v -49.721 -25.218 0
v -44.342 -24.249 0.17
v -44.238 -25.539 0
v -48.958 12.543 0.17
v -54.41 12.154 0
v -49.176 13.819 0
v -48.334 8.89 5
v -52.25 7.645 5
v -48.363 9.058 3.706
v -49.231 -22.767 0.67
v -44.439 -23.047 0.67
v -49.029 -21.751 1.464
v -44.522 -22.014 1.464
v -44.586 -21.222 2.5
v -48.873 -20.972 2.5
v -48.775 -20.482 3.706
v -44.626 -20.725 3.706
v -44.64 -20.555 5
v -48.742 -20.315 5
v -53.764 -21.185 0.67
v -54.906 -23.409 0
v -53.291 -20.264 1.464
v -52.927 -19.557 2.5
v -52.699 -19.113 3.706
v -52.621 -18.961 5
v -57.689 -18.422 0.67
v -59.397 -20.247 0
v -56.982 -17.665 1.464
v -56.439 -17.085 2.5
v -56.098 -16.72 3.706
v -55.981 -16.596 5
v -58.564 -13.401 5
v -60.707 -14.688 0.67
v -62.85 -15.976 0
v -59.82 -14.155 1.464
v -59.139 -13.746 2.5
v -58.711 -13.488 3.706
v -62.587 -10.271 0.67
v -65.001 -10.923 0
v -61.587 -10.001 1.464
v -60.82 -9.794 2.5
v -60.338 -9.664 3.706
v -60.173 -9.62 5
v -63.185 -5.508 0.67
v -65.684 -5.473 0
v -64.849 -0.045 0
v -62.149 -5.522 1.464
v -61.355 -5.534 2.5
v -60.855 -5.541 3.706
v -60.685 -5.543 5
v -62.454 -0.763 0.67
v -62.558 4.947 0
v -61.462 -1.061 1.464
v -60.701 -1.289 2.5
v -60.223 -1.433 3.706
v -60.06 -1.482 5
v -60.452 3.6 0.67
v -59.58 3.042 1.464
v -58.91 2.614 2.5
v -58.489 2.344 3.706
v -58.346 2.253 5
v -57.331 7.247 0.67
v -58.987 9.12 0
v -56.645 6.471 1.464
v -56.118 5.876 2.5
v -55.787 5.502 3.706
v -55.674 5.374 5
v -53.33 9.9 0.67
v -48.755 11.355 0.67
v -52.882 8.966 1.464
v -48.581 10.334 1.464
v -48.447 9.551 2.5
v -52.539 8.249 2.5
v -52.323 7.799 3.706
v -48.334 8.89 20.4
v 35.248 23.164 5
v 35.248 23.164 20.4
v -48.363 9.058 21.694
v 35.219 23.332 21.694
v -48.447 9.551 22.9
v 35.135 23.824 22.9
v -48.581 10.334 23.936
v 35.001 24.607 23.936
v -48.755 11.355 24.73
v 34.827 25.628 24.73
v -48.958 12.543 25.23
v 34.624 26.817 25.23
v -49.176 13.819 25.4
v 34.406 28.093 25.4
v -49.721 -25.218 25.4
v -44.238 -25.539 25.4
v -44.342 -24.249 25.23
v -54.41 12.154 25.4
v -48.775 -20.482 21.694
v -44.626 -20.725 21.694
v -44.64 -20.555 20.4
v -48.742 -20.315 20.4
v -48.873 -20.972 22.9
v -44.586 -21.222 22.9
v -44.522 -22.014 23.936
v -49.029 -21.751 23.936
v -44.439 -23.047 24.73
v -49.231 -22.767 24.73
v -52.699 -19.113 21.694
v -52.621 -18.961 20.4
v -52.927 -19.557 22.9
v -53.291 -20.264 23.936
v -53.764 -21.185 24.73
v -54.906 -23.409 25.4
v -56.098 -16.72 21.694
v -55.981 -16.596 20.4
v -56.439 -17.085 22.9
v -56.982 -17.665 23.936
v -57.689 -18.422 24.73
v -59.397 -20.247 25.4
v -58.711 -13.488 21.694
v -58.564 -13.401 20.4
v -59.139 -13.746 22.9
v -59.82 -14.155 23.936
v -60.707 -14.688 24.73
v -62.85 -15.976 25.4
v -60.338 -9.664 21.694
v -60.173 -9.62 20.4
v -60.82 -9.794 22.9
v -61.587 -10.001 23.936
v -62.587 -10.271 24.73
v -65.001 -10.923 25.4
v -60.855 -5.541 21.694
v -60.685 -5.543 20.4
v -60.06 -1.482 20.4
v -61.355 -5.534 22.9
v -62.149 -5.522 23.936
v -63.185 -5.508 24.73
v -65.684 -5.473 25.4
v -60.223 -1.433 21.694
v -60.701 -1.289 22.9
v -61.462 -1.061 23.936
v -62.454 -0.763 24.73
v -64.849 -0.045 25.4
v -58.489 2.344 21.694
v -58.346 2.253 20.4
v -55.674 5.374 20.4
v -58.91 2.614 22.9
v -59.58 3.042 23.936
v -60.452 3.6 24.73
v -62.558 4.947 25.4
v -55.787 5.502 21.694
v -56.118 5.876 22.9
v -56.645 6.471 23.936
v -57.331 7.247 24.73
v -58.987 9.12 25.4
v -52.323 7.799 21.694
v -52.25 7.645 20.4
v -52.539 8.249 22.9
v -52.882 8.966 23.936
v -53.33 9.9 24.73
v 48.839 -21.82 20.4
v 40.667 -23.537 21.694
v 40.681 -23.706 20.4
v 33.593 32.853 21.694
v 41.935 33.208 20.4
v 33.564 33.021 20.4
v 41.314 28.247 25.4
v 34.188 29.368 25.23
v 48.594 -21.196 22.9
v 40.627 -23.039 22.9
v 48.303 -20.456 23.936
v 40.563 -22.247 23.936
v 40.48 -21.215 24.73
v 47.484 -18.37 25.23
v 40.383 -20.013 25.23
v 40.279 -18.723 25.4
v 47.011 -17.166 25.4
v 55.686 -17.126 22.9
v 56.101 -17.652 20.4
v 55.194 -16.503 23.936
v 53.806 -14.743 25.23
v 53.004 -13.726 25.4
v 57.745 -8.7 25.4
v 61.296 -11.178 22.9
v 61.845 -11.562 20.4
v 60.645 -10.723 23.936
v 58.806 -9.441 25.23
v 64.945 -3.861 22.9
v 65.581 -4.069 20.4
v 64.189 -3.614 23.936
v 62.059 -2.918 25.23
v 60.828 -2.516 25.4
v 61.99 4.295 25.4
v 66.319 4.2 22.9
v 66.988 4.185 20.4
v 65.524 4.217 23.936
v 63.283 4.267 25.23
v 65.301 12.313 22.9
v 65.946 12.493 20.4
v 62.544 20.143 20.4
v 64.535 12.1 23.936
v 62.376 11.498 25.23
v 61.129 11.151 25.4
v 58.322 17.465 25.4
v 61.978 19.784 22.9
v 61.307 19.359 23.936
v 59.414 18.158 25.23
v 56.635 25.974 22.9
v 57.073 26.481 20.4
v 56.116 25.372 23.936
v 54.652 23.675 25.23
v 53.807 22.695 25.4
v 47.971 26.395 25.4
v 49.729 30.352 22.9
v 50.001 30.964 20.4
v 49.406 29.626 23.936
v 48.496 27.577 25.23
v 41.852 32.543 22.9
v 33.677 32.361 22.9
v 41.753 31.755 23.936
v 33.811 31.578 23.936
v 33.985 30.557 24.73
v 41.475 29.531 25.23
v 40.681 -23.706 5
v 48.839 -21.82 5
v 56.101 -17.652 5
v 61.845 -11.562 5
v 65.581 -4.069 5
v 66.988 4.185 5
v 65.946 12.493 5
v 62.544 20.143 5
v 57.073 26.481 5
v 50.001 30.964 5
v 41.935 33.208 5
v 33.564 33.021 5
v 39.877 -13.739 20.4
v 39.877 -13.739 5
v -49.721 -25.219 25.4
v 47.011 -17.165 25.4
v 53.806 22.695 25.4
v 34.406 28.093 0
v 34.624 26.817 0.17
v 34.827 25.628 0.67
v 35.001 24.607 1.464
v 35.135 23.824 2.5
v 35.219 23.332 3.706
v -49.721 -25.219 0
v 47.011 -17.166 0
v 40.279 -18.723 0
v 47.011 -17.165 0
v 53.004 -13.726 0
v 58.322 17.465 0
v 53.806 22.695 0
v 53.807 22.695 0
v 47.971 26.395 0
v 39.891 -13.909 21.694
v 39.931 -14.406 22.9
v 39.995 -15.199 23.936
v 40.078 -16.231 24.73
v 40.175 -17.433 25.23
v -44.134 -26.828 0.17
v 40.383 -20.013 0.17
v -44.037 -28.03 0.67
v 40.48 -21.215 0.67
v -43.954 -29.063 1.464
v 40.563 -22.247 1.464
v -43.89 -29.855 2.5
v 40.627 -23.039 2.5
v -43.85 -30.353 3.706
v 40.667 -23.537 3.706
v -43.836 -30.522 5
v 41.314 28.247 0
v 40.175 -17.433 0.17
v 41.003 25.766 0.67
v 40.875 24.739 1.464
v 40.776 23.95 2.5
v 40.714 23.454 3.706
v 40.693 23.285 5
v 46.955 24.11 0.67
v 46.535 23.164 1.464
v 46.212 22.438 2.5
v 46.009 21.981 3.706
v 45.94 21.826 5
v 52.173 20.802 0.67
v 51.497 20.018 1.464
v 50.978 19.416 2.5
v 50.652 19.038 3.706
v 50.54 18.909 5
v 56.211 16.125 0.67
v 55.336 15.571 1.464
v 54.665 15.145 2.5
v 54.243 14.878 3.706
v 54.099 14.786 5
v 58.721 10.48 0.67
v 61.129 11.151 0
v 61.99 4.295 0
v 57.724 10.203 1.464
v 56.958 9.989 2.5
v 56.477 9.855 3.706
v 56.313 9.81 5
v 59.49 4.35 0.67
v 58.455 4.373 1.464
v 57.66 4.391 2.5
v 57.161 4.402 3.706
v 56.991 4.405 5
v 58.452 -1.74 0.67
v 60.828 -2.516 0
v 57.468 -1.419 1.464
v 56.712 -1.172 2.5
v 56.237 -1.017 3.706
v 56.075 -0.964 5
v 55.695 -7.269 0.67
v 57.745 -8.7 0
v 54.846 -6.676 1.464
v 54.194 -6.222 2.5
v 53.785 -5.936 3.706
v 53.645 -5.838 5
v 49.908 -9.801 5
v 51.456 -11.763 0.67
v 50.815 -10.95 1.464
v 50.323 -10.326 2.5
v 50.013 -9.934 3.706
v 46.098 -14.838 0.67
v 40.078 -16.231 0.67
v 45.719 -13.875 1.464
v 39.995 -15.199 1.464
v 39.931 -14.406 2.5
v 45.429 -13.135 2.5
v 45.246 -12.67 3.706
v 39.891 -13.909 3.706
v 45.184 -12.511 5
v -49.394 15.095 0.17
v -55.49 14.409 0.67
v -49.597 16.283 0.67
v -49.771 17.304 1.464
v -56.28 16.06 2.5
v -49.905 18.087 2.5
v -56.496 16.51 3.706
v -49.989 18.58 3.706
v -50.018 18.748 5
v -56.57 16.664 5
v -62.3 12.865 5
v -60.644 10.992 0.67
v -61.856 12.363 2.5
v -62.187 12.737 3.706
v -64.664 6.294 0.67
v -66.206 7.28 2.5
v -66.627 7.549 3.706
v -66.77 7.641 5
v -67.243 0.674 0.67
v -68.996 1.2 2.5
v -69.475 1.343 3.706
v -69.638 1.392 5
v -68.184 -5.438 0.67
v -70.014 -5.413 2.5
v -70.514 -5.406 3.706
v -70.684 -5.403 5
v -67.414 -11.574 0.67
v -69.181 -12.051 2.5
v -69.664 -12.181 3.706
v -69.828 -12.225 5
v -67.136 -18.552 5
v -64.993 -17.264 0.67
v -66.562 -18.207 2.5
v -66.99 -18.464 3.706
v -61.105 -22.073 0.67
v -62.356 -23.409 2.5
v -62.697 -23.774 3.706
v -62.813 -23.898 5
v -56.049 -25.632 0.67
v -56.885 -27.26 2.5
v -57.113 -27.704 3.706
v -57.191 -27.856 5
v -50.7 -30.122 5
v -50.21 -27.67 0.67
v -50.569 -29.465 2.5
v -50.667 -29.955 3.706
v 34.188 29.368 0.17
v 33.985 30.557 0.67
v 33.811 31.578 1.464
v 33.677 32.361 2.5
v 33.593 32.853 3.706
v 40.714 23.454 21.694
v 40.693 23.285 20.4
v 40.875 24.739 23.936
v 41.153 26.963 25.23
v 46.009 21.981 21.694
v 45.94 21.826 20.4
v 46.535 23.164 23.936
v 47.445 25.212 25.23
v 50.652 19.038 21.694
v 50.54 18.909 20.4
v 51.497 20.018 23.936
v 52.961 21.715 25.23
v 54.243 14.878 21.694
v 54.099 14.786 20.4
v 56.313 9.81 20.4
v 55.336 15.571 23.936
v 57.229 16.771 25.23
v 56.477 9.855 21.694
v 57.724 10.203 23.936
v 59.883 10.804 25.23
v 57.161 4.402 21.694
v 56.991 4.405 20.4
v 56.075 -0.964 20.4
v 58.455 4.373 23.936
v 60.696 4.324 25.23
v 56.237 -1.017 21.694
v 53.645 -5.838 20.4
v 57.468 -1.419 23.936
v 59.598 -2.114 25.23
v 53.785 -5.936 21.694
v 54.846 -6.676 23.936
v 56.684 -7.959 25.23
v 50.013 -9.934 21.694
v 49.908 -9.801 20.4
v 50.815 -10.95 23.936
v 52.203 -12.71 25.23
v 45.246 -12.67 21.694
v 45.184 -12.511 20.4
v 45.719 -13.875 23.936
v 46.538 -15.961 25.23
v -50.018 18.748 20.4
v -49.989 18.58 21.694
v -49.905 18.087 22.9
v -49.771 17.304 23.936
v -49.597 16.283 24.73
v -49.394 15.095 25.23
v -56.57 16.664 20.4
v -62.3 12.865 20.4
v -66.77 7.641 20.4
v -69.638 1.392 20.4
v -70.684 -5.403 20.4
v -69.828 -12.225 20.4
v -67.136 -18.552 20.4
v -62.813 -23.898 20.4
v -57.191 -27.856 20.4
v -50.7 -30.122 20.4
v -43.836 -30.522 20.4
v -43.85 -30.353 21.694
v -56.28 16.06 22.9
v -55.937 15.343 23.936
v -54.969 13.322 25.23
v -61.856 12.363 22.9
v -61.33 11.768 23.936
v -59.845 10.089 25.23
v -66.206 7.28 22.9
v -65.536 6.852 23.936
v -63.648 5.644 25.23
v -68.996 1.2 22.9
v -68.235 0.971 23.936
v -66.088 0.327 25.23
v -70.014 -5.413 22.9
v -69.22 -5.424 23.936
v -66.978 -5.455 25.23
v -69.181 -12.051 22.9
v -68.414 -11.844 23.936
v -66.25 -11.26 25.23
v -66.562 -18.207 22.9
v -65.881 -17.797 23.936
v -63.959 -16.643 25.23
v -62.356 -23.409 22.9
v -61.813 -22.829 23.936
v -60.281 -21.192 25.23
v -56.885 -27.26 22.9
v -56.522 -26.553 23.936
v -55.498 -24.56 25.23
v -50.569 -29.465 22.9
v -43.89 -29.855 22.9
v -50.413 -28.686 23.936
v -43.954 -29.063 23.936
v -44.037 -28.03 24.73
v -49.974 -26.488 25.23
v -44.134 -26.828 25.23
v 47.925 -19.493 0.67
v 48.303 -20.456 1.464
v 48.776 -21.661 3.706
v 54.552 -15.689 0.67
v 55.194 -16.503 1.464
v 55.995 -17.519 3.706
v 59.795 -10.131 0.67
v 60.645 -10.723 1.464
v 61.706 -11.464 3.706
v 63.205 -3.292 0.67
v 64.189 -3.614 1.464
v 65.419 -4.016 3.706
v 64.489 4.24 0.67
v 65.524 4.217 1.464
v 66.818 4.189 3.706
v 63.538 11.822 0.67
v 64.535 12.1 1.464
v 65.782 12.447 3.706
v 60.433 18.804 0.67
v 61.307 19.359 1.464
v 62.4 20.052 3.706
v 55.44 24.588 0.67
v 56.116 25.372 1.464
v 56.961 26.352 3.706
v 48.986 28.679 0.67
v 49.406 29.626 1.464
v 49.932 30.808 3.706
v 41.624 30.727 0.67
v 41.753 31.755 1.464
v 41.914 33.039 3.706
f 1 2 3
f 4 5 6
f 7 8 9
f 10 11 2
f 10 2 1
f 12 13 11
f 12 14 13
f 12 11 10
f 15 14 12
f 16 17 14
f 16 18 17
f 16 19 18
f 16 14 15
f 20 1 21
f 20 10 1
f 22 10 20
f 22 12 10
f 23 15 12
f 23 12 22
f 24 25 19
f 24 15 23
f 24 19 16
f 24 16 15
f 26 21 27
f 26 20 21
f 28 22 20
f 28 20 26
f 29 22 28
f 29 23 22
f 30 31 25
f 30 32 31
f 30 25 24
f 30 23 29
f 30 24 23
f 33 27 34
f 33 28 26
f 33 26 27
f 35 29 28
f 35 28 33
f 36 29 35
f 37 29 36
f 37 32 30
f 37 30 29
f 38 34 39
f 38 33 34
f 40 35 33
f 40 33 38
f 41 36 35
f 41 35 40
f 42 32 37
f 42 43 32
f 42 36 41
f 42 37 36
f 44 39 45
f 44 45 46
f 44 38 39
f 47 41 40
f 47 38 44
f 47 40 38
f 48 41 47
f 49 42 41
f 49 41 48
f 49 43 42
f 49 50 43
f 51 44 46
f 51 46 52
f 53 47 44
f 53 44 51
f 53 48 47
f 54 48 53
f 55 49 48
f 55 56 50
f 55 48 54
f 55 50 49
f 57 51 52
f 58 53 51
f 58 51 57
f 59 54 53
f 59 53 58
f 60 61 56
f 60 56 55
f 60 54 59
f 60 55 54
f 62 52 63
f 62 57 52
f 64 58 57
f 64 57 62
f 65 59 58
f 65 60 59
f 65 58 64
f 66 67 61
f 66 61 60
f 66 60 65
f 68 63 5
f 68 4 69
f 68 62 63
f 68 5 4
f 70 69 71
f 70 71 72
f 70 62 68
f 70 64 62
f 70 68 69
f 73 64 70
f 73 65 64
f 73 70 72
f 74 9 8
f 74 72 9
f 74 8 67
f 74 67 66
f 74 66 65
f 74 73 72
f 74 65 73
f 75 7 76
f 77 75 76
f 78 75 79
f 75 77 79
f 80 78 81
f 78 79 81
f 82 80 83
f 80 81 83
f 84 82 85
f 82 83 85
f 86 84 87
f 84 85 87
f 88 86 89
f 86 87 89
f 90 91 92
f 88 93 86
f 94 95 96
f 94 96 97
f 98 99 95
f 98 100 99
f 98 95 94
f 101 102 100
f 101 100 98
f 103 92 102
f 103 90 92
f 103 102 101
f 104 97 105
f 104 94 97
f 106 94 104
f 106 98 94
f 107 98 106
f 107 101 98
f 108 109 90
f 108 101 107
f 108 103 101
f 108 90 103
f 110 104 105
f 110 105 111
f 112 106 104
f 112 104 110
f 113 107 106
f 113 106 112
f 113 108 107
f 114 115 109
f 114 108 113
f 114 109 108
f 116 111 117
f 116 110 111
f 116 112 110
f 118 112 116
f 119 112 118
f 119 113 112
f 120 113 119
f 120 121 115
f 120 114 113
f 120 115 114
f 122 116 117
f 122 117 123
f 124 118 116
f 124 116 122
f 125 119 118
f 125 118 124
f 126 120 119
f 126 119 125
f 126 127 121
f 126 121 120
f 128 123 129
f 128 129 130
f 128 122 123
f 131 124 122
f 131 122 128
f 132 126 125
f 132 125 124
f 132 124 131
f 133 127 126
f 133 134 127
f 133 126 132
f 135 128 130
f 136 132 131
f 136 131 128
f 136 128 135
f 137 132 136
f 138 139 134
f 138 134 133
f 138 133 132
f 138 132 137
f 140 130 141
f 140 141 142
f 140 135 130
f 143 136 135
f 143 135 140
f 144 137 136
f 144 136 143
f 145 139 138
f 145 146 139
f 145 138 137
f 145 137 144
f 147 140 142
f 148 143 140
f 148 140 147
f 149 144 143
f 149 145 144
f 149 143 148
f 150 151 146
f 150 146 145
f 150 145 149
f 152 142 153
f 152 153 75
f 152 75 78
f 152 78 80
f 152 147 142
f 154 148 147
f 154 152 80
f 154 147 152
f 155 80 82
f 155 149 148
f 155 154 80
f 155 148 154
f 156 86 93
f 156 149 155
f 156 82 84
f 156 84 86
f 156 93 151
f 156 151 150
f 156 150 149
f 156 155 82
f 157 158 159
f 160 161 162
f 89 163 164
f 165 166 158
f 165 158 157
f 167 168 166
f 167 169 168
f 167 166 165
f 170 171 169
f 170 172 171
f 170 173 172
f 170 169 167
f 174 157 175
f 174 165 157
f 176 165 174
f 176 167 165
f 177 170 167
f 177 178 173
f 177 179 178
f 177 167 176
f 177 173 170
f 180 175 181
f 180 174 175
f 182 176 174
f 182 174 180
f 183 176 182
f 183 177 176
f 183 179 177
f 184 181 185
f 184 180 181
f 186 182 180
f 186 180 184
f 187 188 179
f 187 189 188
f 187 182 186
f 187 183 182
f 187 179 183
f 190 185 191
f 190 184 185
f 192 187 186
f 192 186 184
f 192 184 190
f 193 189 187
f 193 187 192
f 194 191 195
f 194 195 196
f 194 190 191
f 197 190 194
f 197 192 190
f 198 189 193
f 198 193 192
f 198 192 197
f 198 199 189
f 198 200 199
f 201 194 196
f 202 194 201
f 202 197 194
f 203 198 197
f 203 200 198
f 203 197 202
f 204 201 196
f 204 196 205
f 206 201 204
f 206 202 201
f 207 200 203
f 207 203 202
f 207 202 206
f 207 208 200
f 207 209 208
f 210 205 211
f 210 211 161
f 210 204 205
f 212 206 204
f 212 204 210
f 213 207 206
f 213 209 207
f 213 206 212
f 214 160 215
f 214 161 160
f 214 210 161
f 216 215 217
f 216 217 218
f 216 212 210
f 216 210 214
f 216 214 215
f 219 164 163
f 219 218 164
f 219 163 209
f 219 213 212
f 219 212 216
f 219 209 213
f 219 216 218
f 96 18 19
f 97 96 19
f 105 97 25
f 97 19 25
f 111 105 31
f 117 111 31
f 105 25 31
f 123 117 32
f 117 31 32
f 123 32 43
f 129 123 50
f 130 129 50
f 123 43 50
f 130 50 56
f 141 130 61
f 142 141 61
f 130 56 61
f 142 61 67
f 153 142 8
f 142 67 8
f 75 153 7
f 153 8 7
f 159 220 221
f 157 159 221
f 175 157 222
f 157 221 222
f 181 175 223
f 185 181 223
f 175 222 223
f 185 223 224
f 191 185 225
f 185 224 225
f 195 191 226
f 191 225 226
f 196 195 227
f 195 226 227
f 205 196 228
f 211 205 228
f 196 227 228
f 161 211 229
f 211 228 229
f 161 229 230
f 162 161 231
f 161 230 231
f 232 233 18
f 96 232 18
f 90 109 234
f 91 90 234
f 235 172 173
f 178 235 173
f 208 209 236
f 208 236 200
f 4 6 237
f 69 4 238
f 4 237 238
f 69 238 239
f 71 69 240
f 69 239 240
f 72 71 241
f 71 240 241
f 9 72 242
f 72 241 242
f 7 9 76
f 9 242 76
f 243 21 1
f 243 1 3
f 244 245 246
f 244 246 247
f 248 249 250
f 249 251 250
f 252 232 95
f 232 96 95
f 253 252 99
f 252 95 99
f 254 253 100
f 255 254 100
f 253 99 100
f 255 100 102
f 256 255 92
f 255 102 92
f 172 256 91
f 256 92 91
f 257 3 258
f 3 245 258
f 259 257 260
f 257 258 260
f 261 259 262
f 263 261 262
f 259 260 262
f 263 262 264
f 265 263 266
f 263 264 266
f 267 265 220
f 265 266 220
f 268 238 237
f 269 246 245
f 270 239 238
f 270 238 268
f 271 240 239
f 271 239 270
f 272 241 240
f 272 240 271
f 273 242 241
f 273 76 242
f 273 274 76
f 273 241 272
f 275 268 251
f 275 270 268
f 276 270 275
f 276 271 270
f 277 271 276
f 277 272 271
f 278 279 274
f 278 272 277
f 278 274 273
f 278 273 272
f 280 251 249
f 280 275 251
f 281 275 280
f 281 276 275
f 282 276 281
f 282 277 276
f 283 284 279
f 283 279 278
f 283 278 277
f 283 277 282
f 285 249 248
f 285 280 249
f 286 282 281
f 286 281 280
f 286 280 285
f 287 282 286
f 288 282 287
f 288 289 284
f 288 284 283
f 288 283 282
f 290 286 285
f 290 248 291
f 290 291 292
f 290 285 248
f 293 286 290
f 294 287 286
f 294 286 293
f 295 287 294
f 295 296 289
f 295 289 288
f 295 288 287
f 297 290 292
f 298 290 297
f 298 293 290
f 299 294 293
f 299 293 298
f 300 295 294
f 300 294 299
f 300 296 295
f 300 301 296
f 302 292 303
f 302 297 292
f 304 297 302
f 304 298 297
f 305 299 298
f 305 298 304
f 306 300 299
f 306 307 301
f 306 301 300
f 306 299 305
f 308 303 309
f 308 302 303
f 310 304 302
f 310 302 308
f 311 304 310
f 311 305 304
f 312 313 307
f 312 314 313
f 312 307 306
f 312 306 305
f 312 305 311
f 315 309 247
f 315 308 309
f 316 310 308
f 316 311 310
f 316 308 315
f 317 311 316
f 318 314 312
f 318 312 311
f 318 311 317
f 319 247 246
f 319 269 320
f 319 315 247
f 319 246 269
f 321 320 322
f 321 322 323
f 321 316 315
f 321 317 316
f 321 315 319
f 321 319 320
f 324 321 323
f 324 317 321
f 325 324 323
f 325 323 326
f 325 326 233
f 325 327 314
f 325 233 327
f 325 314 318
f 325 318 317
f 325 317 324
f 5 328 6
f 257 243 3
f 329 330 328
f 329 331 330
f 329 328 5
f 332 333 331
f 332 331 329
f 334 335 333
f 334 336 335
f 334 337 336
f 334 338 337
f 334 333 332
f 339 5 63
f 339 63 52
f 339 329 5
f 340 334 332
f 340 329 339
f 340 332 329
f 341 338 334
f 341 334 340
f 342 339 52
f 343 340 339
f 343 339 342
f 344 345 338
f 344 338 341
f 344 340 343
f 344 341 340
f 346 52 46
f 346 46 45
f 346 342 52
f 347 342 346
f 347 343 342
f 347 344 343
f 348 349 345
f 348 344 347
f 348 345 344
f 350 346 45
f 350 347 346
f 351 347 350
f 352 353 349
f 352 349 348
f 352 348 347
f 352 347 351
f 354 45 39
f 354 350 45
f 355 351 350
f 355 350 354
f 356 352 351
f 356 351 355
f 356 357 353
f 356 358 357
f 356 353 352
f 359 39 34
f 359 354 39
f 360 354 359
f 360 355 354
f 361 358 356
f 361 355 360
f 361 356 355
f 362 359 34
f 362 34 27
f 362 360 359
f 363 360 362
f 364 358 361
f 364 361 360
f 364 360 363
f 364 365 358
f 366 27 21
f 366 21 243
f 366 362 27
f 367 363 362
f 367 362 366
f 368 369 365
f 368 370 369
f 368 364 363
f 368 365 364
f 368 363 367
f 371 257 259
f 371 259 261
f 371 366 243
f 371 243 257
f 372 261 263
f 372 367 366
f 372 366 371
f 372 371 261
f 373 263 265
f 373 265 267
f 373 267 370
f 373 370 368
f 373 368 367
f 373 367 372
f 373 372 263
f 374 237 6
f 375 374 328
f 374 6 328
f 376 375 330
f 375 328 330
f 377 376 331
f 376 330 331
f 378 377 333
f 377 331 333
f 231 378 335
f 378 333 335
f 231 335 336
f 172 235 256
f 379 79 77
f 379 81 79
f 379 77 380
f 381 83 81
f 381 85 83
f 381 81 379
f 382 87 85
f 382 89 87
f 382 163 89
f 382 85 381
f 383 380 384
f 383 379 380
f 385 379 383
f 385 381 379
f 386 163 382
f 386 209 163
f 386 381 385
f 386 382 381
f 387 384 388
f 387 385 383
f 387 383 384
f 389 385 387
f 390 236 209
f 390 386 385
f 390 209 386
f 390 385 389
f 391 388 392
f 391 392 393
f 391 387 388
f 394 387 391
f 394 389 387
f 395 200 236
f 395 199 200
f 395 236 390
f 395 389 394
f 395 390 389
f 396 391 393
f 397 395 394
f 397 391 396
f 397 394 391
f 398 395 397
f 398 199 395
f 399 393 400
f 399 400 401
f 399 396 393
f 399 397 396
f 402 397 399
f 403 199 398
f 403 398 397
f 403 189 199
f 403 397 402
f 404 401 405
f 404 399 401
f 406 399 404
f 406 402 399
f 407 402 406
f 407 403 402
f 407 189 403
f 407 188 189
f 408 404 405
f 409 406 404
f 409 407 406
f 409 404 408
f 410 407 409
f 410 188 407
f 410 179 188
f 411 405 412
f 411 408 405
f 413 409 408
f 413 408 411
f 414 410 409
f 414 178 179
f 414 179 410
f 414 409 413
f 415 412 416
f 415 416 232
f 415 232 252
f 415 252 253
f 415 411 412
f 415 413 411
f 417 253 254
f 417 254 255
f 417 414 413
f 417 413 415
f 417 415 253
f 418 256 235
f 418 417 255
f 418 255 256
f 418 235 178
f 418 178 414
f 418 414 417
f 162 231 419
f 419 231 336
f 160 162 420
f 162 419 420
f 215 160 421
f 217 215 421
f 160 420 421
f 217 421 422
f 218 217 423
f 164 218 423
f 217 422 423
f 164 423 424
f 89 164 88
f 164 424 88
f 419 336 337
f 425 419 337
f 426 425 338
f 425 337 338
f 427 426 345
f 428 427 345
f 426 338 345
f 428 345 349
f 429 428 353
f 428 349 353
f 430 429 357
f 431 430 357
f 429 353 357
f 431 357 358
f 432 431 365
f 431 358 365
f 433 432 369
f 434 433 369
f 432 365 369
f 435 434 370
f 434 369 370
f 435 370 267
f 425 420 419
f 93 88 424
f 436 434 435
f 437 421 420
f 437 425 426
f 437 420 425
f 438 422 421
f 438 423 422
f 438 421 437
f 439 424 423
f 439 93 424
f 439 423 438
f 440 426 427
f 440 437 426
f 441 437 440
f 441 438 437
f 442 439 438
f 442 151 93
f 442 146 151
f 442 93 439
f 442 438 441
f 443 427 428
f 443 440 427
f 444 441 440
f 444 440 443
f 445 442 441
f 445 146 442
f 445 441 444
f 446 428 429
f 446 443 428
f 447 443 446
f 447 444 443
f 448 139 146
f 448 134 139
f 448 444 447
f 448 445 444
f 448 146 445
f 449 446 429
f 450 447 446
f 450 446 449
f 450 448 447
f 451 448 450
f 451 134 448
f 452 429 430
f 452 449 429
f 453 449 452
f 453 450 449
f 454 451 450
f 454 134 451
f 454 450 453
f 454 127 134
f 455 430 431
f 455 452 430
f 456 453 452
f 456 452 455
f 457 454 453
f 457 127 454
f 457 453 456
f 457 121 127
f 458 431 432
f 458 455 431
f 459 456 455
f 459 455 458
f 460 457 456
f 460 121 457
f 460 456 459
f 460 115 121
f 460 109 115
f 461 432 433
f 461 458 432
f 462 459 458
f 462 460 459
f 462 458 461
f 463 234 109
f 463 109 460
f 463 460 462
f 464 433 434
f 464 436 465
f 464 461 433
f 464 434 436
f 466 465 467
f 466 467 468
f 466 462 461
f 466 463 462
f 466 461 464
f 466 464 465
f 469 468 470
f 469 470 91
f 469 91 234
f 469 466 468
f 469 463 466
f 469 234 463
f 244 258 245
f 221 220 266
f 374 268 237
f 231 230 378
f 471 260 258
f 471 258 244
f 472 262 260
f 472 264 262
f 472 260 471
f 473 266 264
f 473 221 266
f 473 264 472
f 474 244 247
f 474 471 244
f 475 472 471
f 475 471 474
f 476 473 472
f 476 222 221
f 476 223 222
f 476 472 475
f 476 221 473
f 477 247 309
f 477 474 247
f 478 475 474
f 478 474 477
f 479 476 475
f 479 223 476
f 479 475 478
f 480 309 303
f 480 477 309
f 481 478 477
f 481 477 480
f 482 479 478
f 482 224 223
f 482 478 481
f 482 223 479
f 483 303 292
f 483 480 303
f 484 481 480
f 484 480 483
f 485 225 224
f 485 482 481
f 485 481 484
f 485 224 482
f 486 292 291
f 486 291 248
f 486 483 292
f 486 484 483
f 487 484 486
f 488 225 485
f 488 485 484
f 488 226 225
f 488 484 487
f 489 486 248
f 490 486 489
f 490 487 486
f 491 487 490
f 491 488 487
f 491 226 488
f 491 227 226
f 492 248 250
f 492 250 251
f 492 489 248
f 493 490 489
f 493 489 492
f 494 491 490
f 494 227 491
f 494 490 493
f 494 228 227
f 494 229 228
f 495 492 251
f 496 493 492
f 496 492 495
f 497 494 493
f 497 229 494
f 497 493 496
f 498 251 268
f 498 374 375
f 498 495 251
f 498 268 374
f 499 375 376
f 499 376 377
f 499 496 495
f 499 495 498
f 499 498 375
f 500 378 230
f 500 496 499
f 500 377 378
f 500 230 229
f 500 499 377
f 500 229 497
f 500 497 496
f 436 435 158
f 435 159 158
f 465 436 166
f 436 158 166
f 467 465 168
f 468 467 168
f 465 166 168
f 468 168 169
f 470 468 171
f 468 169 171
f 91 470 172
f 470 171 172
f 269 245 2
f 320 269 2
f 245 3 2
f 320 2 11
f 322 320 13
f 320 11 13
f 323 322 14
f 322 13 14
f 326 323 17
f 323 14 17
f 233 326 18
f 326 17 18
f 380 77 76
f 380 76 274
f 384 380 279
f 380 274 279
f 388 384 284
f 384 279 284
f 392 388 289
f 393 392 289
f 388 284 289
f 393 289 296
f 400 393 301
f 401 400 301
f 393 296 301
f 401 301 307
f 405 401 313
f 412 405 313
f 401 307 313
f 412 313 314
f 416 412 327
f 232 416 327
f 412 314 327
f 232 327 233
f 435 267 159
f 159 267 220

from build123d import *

# Parameters (mm, degrees)
F1_DEPTH = 25.4
F2_R     = 4.99999
F3_R     = 4.99999


# Not quite as in the source:
# - a fillet or chamfer is up to 0.001 mm smaller than in the source, because OpenCascade refuses the exact size


with BuildPart() as f1:
    # F0 (on Top) → F1 (new body)
    with BuildSketch(Plane.XY):
        with BuildLine():
            Line((33.5641757438, 33.0211686649), (-50.0175157615, 18.7475354366))
            ThreePointArc((-50.0175157615, 18.7475354366), (-70.4930751684, -8.8439952597), (-43.8361644944, -30.5223303552))
            Line((-43.8361644944, -30.5223303552), (40.6811656436, -23.7064175959))
            ThreePointArc((40.6811656436, -23.7064175959), (66.7727246476, 8.377243564), (33.5641757438, 33.0211686649))
        make_face()
        with BuildLine():
            Line((39.8773238571, -13.7387780367), (-44.640006281, -20.554690796))
            ThreePointArc((-44.640006281, -20.554690796), (-60.5708580224, -7.5991631795), (-48.3341399261, 8.8902413963))
            Line((-48.3341399261, 8.8902413963), (35.2475515791, 23.1638746246))
            ThreePointArc((35.2475515791, 23.1638746246), (56.8505075016, 7.1324114838), (39.8773238571, -13.7387780367))
        make_face(mode=Mode.SUBTRACT)
    extrude(amount=F1_DEPTH)

    # F2 (radius 5 in the source; OpenCascade refuses exactly that, so slightly less here)
    f2_edges = [f1.edges().sort_by_distance(p)[0] for p in [
        (-2.381341, -17.146734, 25.4),
        (-1.577499, -27.114374, 25.4),
    ]]
    fillet(f2_edges, radius=F2_R)

    # F3 (radius 5 in the source; OpenCascade refuses exactly that, so slightly less here)
    f3_edges = [f1.edges().sort_by_distance(p)[0] for p in [
        (-1.577499, -27.114374, 0),
        (66.772725, 8.377244, 0),
        (-8.22667, 25.884352, 0),
        (-70.493075, -8.843995, 0),
        (56.850508, 7.132411, 0),
        (-2.381341, -17.146734, 0),
        (-60.570858, -7.599163, 0),
        (-6.543294, 16.027058, 0),
    ]]
    fillet(f3_edges, radius=F3_R)


solid = f1.part
